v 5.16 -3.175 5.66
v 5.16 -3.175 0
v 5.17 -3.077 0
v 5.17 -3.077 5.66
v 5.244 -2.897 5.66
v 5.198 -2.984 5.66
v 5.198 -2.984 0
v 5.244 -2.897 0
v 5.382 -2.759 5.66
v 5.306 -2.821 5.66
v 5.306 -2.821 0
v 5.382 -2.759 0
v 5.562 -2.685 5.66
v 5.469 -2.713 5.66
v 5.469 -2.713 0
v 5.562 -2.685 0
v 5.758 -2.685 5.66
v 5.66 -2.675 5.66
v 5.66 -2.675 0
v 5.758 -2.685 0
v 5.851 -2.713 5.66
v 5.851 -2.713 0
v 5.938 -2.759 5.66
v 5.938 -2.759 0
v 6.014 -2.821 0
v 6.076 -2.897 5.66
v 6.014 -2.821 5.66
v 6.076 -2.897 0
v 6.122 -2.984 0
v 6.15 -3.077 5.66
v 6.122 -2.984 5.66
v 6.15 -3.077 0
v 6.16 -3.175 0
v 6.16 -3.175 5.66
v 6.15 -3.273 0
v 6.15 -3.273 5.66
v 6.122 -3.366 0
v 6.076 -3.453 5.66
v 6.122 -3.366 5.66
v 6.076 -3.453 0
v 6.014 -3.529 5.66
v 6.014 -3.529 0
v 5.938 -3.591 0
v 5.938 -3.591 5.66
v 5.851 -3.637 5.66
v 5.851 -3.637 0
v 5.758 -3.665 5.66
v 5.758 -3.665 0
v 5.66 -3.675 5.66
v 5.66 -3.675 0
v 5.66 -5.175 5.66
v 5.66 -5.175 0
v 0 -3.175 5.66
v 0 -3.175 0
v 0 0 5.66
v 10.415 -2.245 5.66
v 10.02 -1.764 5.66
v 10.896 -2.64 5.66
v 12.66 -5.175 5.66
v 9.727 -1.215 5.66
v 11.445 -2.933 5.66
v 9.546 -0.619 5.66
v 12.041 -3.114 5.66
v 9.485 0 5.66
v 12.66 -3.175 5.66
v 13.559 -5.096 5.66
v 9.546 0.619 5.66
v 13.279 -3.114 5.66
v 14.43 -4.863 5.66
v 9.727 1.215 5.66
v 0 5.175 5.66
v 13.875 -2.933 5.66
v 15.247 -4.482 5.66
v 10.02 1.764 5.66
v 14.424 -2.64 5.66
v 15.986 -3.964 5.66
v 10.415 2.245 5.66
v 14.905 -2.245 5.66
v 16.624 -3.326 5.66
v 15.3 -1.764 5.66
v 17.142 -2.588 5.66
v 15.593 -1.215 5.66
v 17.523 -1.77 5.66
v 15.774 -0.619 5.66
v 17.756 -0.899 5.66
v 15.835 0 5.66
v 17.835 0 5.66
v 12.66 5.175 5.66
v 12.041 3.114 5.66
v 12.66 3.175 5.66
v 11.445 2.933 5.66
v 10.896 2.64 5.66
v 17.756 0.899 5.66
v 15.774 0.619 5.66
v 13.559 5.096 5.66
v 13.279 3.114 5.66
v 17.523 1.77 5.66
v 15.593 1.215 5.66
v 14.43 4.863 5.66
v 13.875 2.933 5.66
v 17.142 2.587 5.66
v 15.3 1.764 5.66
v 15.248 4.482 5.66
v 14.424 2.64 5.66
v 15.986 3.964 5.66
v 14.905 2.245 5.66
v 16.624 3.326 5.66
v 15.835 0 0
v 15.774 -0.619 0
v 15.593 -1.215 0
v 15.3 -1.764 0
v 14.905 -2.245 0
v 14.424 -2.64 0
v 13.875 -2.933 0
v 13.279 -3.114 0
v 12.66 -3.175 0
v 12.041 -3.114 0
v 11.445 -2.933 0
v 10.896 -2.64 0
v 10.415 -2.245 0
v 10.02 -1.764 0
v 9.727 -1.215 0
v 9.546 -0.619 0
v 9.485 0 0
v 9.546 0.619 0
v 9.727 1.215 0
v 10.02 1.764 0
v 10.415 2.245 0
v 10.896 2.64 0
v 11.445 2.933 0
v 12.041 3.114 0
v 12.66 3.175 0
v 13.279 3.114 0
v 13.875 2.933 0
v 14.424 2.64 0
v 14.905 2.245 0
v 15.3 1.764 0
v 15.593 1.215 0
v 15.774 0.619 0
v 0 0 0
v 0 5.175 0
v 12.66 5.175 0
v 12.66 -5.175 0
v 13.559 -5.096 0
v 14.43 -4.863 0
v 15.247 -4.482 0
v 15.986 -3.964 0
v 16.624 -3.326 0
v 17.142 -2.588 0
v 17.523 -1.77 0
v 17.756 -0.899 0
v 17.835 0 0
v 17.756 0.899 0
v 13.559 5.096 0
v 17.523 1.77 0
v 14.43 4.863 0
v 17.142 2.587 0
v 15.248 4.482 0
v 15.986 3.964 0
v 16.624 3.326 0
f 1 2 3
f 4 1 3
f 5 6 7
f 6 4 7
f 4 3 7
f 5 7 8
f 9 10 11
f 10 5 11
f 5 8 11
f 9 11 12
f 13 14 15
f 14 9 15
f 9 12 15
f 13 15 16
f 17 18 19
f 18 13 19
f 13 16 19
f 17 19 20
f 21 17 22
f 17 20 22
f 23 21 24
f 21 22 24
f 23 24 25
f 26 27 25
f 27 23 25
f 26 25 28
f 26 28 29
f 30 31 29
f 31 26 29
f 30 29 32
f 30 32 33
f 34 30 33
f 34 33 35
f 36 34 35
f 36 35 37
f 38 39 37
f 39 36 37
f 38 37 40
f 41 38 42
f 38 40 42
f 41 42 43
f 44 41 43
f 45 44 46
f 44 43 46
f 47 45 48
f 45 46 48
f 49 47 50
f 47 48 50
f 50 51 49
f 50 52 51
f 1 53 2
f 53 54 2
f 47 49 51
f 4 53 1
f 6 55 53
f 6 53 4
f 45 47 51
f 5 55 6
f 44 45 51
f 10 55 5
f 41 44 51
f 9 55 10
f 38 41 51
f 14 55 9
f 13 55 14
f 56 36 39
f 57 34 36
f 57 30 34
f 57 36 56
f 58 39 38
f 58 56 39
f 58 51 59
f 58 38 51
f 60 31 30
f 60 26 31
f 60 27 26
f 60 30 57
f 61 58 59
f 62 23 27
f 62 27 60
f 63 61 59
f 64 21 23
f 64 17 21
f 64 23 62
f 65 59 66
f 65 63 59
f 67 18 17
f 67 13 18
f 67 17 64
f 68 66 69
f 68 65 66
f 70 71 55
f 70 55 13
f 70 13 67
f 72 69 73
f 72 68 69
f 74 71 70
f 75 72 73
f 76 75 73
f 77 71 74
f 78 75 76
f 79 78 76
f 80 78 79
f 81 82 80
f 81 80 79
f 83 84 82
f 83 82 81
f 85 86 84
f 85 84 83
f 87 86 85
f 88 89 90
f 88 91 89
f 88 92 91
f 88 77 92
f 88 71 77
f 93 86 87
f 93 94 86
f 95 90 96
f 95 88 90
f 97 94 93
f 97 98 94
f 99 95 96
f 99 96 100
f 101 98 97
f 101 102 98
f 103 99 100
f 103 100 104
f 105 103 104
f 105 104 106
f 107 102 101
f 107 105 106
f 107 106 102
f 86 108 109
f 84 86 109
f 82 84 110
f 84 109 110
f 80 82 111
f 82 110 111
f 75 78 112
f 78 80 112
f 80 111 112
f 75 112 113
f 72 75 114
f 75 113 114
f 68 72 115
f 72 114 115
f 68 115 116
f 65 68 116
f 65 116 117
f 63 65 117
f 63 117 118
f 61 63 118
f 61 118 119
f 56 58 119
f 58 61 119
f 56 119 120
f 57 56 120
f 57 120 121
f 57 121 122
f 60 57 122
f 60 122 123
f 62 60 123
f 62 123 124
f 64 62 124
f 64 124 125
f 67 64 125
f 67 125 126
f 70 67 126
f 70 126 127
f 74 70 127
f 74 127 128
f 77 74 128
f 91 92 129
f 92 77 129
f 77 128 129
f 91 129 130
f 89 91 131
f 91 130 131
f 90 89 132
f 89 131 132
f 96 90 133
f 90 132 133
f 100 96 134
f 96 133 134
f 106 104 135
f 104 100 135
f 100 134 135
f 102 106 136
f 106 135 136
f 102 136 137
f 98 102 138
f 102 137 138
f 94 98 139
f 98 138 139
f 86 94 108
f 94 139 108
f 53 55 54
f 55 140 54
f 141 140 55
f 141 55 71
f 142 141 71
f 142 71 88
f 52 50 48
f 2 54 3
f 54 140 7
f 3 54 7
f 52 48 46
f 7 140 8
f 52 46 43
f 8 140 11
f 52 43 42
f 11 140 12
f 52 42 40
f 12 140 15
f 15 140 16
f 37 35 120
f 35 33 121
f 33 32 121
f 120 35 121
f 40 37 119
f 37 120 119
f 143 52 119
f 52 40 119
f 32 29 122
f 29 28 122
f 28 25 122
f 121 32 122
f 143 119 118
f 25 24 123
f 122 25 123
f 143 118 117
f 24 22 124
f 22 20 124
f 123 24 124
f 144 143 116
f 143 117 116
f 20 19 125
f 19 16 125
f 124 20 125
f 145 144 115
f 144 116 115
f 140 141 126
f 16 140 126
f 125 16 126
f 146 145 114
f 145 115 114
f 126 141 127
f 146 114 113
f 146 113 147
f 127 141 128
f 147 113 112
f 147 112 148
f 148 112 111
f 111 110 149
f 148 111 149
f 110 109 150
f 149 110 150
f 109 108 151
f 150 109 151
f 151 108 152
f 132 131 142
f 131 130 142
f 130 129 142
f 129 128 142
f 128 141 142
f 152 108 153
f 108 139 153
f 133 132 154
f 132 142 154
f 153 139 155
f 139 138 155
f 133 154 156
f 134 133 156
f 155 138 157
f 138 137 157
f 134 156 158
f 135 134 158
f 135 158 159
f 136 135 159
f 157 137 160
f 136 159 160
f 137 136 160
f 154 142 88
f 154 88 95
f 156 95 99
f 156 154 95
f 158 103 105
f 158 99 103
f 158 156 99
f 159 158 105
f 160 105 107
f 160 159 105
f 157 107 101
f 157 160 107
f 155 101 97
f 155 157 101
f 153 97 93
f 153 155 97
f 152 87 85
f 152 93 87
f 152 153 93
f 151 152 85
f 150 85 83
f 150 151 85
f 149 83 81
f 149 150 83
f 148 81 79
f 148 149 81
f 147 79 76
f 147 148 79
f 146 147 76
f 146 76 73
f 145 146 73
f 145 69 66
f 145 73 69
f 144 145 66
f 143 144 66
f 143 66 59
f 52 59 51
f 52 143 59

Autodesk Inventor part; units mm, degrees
ref_plane "YZ Plane" through (0, 0, 0) normal (1, 0, 0) x (0, 1, 0)
ref_plane "XZ Plane" through (0, 0, 0) normal (0, 1, 0) x (-1, 0, 0)
ref_plane "XY Plane" through (0, 0, 0) normal (0, 0, 1) x (1, 0, 0)
sketch "Sketch1" plane through (0, 0, 0) normal (0, 0, 1) x (1, 0, 0)
  line L0 (0, 0) -> (0, -3.175)
  line L1 (0, -3.175) -> (5.16, -3.175)
  line L2 (0, 0) -> (0, 5.175)
  line L3 (0, 5.175) -> (12.66, 5.175)
  arc A0 (12.66, -5.175) -> (12.66, 5.175) centre (12.66, 0) ccw
  line L4 (12.66, -5.175) -> (5.66, -5.175)
  line L5 (5.66, -5.175) -> (5.66, -3.675)
  circle A1 centre (12.66, 0) radius 3.175
  arc A2 (5.66, -3.675) -> (5.16, -3.175) centre (5.66, -3.175) ccw
  dimension "d3" = 5.175
  dimension "d4" = 6.35
  dimension "d7" = 7
  dimension "d9" = 2
  dimension "d10" = 5.66
  dimension "d11" = 1
  dimension "d12" = 5.66
extrude "Extrusion1" add sketch "Sketch1" along normal blind 5.66
properties part number "Lower Arm Bracket"
